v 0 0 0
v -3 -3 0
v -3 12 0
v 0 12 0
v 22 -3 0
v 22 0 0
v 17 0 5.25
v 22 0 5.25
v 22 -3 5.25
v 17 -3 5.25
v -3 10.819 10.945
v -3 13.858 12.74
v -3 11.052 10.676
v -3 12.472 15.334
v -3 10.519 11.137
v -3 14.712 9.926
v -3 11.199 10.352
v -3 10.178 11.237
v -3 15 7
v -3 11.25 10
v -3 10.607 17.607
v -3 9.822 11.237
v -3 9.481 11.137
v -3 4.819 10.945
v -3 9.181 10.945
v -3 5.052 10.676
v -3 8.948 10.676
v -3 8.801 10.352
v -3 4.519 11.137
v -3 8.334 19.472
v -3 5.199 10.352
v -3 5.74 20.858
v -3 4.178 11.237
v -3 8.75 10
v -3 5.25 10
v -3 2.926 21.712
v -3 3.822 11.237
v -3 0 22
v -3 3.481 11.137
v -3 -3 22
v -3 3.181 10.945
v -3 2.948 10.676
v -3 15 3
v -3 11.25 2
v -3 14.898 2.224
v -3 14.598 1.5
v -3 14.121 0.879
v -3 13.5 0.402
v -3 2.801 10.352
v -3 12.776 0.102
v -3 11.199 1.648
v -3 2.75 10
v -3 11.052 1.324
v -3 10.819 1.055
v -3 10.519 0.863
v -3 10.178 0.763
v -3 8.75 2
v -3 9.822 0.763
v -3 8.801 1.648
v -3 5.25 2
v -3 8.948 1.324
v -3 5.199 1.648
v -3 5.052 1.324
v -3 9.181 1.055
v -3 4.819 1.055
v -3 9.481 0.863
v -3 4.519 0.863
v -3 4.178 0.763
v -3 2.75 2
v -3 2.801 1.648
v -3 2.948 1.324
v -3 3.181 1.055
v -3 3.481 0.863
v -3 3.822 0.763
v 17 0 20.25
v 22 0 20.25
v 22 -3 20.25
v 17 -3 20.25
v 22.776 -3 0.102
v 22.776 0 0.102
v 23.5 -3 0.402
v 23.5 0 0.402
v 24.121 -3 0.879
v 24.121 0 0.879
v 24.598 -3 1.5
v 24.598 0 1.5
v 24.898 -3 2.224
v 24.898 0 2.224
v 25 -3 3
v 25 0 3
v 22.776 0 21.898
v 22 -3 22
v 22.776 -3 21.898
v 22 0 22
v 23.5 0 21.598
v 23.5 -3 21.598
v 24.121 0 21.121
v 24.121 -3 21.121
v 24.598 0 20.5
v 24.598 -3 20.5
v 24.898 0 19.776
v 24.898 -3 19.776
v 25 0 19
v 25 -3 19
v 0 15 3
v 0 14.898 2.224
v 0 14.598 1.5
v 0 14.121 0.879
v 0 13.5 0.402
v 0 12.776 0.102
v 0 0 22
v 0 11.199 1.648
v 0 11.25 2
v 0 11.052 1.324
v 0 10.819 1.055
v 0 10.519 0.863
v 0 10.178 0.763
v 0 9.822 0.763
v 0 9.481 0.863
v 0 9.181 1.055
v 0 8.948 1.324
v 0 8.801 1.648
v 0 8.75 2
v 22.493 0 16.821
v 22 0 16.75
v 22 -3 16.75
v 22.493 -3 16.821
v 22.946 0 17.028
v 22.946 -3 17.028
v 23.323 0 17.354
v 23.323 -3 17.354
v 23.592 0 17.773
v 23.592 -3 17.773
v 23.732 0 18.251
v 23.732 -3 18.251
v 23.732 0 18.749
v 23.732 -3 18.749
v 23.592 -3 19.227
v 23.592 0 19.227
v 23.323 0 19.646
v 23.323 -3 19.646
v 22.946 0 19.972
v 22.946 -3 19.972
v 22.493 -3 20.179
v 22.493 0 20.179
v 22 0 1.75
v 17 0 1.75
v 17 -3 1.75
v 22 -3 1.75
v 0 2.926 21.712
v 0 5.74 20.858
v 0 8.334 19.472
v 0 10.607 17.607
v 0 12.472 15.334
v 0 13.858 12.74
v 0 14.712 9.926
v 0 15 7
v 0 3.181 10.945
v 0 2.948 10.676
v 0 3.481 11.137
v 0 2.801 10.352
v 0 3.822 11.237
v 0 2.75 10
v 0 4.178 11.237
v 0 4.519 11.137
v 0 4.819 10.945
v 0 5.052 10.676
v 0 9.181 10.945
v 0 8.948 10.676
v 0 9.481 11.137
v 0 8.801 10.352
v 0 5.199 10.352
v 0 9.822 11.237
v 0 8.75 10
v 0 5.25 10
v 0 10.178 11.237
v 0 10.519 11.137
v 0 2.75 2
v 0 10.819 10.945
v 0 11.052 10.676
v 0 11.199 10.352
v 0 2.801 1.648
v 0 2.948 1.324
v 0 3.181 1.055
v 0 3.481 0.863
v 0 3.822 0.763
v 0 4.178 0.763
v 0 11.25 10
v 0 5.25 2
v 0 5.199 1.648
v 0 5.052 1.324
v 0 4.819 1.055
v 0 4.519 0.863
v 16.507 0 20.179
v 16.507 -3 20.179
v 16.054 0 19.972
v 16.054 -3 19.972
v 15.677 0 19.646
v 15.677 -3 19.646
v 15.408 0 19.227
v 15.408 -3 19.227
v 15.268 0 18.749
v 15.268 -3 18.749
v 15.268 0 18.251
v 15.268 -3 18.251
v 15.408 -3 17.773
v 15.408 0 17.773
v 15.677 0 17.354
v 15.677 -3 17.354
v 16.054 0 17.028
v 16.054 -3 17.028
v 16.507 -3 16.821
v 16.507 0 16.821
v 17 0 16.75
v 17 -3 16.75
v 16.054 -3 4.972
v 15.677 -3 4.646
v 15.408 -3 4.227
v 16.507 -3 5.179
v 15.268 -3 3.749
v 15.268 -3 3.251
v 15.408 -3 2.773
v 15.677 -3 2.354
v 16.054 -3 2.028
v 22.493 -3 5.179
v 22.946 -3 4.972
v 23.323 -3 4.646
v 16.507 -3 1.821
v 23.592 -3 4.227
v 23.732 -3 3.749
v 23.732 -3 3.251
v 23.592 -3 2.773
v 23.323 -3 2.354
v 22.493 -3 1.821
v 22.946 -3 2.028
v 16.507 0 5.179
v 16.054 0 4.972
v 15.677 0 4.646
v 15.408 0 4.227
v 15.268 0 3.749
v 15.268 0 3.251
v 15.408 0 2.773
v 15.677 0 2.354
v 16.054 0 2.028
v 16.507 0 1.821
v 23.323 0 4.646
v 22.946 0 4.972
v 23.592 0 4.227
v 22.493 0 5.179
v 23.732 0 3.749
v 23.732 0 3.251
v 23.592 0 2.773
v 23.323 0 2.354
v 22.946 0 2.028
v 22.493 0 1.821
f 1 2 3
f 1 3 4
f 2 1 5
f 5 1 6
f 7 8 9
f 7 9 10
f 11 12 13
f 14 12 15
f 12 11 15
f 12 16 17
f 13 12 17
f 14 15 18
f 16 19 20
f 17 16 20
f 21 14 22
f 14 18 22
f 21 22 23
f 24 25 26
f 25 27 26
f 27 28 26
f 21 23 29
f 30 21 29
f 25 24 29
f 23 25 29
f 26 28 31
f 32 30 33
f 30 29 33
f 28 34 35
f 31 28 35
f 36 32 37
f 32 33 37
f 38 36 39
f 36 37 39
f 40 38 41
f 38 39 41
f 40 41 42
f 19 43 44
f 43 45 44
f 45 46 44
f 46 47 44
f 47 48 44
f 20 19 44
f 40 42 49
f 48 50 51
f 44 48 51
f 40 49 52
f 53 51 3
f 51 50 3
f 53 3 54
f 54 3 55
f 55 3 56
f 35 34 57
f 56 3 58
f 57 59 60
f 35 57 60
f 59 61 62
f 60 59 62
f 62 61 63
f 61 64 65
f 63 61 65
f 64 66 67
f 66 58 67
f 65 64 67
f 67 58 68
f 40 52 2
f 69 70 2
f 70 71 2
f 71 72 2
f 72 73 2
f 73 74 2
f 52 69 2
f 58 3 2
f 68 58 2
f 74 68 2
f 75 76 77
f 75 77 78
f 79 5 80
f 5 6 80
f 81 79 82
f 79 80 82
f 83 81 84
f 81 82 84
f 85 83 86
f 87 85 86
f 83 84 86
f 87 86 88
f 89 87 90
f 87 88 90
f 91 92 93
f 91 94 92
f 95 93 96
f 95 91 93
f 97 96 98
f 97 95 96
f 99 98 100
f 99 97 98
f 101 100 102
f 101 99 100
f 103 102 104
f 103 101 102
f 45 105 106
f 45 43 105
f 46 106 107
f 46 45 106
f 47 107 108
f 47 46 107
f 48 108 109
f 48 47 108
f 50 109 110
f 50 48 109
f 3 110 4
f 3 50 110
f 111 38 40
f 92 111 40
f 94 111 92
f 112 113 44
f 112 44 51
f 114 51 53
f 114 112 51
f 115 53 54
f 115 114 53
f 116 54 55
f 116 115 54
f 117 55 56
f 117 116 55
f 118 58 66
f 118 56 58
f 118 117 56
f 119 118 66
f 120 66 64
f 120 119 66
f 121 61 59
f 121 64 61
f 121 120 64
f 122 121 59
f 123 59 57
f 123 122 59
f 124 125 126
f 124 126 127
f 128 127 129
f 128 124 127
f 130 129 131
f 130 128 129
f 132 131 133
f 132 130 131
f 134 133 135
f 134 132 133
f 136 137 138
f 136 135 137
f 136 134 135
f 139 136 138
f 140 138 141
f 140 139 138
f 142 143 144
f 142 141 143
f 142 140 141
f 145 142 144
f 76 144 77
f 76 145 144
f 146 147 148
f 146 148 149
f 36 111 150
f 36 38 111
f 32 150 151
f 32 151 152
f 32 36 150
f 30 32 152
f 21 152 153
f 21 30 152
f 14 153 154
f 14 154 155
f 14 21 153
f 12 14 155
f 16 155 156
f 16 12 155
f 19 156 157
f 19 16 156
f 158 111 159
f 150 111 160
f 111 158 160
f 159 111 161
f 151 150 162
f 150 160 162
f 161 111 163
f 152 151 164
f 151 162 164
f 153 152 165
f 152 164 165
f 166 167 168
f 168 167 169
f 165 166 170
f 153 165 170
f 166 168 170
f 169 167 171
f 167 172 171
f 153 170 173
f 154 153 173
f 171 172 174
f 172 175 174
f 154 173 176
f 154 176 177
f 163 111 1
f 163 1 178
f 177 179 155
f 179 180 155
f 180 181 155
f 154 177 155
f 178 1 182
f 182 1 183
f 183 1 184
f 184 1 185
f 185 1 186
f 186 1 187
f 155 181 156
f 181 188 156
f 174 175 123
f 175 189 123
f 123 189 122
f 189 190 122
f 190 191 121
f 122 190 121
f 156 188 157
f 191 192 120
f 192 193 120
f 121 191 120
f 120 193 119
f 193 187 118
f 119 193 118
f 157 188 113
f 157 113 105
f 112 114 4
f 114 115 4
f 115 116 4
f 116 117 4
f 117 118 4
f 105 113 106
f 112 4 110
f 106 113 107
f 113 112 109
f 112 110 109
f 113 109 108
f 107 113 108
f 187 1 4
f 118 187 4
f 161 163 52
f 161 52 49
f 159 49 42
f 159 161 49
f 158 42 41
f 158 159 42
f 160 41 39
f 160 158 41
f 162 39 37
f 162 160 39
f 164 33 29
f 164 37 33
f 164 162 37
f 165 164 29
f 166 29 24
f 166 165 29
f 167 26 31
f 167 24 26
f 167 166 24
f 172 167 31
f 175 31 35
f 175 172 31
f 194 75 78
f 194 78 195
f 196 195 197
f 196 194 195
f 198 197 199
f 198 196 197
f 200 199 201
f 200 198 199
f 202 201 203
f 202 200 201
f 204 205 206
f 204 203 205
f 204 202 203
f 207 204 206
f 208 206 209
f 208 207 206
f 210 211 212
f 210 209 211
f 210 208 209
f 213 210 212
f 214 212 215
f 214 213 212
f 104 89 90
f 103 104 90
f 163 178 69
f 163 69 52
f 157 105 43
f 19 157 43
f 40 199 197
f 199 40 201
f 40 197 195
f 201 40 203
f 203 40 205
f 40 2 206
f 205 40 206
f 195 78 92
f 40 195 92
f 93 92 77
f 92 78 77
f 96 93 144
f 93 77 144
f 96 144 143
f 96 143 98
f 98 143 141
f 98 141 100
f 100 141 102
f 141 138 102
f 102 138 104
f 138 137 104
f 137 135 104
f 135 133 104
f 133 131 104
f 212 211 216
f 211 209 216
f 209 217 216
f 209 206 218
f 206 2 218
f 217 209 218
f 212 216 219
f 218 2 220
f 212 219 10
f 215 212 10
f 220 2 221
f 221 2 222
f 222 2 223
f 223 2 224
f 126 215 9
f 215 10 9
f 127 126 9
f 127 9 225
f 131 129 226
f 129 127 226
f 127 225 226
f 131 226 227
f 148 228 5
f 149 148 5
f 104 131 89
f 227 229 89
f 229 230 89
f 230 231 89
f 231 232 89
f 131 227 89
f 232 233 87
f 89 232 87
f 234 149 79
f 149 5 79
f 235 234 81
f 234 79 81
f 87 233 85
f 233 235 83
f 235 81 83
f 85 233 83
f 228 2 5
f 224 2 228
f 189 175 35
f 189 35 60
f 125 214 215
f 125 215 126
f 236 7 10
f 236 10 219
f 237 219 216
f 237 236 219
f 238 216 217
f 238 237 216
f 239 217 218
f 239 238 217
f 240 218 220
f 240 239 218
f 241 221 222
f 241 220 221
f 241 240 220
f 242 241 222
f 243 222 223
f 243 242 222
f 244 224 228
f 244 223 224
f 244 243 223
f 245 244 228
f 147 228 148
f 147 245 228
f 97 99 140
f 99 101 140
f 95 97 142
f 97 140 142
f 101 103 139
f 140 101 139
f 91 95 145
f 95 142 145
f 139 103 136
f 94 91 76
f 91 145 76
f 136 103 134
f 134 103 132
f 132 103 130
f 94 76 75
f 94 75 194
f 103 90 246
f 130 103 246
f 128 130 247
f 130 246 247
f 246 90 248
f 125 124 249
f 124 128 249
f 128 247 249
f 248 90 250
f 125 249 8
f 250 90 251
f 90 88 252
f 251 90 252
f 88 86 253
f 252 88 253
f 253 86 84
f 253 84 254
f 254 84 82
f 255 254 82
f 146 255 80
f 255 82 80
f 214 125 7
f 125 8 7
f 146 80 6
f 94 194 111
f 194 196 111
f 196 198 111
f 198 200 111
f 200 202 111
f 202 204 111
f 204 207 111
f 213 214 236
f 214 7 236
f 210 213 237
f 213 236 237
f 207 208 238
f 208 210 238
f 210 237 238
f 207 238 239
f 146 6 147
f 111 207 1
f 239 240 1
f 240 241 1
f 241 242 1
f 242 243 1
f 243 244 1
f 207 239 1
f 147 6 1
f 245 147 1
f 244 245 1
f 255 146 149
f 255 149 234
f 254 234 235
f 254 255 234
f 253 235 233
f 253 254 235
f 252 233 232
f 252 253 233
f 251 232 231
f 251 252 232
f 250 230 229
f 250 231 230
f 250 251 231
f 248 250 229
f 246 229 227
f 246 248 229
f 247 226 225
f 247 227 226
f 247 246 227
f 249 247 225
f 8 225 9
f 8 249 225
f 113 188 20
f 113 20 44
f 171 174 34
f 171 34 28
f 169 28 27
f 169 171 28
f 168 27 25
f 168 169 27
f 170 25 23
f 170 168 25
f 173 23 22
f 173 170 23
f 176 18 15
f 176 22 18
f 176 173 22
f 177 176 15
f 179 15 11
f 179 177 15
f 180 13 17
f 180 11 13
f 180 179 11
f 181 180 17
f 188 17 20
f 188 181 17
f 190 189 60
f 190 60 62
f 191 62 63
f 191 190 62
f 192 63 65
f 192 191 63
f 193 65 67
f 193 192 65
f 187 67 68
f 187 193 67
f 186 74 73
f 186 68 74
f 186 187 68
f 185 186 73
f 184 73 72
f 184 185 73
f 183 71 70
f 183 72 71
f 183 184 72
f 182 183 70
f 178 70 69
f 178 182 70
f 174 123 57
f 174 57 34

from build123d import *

# Parameters (mm, degrees)
BOSS_EXTRUDE1_DEPTH = 22
CUT_EXTRUDE1_DEPTH  = 4
CUT_EXTRUDE2_DEPTH  = 4
FILLET1_R           = 15
FILLET2_R           = 3


with BuildPart() as part:
    # Sketch1 → Boss-Extrude1 (new body)
    with BuildSketch(Plane.XY):
        Polygon((0, 0), (0, 15), (-3, 15), (-3, -3), (25, -3), (25, 0), align=None)
    extrude(amount=BOSS_EXTRUDE1_DEPTH)

    # Sketch2 → Cut-Extrude1 (cut, through all)
    with BuildSketch(Plane(origin=(0, 0, 0), x_dir=(1, 0, 0), z_dir=(0, 1, 0))):
        with BuildLine():
            Line((17, -1.75), (22, -1.75))
            ThreePointArc((22, -1.75), (23.75, -3.5), (22, -5.25))
            Line((22, -5.25), (17, -5.25))
            ThreePointArc((17, -5.25), (15.25, -3.5), (17, -1.75))
        make_face()
        with BuildLine():
            Line((17, -16.75), (22, -16.75))
            ThreePointArc((22, -16.75), (23.75, -18.5), (22, -20.25))
            Line((22, -20.25), (17, -20.25))
            ThreePointArc((17, -20.25), (15.25, -18.5), (17, -16.75))
        make_face()
    extrude(amount=-CUT_EXTRUDE1_DEPTH, mode=Mode.SUBTRACT)

    # Sketch3 → Cut-Extrude2 (cut, through all)
    with BuildSketch(Plane(origin=(0, 0, 0), x_dir=(0, 0, -1), z_dir=(1, 0, 0))):
        with BuildLine():
            Line((-10, 11.25), (-2, 11.25))
            ThreePointArc((-2, 11.25), (-0.75, 10), (-2, 8.75))
            Line((-2, 8.75), (-10, 8.75))
            ThreePointArc((-10, 8.75), (-11.25, 10), (-10, 11.25))
        make_face()
        with BuildLine():
            Line((-10, 5.25), (-2, 5.25))
            ThreePointArc((-2, 5.25), (-0.75, 4), (-2, 2.75))
            Line((-2, 2.75), (-10, 2.75))
            ThreePointArc((-10, 2.75), (-11.25, 4), (-10, 5.25))
        make_face()
    extrude(amount=-CUT_EXTRUDE2_DEPTH, mode=Mode.SUBTRACT)

    # Fillet1
    fillet1_edges = [part.edges().sort_by_distance(p)[0] for p in [
        (-1.5, 15, 22),
    ]]
    fillet(fillet1_edges, radius=FILLET1_R)

    # Fillet2
    fillet2_edges = [part.edges().sort_by_distance(p)[0] for p in [
        (25, -1.5, 22),
        (25, -1.5, 0),
        (-1.5, 15, 0),
    ]]
    fillet(fillet2_edges, radius=FILLET2_R)


solid = part.part
